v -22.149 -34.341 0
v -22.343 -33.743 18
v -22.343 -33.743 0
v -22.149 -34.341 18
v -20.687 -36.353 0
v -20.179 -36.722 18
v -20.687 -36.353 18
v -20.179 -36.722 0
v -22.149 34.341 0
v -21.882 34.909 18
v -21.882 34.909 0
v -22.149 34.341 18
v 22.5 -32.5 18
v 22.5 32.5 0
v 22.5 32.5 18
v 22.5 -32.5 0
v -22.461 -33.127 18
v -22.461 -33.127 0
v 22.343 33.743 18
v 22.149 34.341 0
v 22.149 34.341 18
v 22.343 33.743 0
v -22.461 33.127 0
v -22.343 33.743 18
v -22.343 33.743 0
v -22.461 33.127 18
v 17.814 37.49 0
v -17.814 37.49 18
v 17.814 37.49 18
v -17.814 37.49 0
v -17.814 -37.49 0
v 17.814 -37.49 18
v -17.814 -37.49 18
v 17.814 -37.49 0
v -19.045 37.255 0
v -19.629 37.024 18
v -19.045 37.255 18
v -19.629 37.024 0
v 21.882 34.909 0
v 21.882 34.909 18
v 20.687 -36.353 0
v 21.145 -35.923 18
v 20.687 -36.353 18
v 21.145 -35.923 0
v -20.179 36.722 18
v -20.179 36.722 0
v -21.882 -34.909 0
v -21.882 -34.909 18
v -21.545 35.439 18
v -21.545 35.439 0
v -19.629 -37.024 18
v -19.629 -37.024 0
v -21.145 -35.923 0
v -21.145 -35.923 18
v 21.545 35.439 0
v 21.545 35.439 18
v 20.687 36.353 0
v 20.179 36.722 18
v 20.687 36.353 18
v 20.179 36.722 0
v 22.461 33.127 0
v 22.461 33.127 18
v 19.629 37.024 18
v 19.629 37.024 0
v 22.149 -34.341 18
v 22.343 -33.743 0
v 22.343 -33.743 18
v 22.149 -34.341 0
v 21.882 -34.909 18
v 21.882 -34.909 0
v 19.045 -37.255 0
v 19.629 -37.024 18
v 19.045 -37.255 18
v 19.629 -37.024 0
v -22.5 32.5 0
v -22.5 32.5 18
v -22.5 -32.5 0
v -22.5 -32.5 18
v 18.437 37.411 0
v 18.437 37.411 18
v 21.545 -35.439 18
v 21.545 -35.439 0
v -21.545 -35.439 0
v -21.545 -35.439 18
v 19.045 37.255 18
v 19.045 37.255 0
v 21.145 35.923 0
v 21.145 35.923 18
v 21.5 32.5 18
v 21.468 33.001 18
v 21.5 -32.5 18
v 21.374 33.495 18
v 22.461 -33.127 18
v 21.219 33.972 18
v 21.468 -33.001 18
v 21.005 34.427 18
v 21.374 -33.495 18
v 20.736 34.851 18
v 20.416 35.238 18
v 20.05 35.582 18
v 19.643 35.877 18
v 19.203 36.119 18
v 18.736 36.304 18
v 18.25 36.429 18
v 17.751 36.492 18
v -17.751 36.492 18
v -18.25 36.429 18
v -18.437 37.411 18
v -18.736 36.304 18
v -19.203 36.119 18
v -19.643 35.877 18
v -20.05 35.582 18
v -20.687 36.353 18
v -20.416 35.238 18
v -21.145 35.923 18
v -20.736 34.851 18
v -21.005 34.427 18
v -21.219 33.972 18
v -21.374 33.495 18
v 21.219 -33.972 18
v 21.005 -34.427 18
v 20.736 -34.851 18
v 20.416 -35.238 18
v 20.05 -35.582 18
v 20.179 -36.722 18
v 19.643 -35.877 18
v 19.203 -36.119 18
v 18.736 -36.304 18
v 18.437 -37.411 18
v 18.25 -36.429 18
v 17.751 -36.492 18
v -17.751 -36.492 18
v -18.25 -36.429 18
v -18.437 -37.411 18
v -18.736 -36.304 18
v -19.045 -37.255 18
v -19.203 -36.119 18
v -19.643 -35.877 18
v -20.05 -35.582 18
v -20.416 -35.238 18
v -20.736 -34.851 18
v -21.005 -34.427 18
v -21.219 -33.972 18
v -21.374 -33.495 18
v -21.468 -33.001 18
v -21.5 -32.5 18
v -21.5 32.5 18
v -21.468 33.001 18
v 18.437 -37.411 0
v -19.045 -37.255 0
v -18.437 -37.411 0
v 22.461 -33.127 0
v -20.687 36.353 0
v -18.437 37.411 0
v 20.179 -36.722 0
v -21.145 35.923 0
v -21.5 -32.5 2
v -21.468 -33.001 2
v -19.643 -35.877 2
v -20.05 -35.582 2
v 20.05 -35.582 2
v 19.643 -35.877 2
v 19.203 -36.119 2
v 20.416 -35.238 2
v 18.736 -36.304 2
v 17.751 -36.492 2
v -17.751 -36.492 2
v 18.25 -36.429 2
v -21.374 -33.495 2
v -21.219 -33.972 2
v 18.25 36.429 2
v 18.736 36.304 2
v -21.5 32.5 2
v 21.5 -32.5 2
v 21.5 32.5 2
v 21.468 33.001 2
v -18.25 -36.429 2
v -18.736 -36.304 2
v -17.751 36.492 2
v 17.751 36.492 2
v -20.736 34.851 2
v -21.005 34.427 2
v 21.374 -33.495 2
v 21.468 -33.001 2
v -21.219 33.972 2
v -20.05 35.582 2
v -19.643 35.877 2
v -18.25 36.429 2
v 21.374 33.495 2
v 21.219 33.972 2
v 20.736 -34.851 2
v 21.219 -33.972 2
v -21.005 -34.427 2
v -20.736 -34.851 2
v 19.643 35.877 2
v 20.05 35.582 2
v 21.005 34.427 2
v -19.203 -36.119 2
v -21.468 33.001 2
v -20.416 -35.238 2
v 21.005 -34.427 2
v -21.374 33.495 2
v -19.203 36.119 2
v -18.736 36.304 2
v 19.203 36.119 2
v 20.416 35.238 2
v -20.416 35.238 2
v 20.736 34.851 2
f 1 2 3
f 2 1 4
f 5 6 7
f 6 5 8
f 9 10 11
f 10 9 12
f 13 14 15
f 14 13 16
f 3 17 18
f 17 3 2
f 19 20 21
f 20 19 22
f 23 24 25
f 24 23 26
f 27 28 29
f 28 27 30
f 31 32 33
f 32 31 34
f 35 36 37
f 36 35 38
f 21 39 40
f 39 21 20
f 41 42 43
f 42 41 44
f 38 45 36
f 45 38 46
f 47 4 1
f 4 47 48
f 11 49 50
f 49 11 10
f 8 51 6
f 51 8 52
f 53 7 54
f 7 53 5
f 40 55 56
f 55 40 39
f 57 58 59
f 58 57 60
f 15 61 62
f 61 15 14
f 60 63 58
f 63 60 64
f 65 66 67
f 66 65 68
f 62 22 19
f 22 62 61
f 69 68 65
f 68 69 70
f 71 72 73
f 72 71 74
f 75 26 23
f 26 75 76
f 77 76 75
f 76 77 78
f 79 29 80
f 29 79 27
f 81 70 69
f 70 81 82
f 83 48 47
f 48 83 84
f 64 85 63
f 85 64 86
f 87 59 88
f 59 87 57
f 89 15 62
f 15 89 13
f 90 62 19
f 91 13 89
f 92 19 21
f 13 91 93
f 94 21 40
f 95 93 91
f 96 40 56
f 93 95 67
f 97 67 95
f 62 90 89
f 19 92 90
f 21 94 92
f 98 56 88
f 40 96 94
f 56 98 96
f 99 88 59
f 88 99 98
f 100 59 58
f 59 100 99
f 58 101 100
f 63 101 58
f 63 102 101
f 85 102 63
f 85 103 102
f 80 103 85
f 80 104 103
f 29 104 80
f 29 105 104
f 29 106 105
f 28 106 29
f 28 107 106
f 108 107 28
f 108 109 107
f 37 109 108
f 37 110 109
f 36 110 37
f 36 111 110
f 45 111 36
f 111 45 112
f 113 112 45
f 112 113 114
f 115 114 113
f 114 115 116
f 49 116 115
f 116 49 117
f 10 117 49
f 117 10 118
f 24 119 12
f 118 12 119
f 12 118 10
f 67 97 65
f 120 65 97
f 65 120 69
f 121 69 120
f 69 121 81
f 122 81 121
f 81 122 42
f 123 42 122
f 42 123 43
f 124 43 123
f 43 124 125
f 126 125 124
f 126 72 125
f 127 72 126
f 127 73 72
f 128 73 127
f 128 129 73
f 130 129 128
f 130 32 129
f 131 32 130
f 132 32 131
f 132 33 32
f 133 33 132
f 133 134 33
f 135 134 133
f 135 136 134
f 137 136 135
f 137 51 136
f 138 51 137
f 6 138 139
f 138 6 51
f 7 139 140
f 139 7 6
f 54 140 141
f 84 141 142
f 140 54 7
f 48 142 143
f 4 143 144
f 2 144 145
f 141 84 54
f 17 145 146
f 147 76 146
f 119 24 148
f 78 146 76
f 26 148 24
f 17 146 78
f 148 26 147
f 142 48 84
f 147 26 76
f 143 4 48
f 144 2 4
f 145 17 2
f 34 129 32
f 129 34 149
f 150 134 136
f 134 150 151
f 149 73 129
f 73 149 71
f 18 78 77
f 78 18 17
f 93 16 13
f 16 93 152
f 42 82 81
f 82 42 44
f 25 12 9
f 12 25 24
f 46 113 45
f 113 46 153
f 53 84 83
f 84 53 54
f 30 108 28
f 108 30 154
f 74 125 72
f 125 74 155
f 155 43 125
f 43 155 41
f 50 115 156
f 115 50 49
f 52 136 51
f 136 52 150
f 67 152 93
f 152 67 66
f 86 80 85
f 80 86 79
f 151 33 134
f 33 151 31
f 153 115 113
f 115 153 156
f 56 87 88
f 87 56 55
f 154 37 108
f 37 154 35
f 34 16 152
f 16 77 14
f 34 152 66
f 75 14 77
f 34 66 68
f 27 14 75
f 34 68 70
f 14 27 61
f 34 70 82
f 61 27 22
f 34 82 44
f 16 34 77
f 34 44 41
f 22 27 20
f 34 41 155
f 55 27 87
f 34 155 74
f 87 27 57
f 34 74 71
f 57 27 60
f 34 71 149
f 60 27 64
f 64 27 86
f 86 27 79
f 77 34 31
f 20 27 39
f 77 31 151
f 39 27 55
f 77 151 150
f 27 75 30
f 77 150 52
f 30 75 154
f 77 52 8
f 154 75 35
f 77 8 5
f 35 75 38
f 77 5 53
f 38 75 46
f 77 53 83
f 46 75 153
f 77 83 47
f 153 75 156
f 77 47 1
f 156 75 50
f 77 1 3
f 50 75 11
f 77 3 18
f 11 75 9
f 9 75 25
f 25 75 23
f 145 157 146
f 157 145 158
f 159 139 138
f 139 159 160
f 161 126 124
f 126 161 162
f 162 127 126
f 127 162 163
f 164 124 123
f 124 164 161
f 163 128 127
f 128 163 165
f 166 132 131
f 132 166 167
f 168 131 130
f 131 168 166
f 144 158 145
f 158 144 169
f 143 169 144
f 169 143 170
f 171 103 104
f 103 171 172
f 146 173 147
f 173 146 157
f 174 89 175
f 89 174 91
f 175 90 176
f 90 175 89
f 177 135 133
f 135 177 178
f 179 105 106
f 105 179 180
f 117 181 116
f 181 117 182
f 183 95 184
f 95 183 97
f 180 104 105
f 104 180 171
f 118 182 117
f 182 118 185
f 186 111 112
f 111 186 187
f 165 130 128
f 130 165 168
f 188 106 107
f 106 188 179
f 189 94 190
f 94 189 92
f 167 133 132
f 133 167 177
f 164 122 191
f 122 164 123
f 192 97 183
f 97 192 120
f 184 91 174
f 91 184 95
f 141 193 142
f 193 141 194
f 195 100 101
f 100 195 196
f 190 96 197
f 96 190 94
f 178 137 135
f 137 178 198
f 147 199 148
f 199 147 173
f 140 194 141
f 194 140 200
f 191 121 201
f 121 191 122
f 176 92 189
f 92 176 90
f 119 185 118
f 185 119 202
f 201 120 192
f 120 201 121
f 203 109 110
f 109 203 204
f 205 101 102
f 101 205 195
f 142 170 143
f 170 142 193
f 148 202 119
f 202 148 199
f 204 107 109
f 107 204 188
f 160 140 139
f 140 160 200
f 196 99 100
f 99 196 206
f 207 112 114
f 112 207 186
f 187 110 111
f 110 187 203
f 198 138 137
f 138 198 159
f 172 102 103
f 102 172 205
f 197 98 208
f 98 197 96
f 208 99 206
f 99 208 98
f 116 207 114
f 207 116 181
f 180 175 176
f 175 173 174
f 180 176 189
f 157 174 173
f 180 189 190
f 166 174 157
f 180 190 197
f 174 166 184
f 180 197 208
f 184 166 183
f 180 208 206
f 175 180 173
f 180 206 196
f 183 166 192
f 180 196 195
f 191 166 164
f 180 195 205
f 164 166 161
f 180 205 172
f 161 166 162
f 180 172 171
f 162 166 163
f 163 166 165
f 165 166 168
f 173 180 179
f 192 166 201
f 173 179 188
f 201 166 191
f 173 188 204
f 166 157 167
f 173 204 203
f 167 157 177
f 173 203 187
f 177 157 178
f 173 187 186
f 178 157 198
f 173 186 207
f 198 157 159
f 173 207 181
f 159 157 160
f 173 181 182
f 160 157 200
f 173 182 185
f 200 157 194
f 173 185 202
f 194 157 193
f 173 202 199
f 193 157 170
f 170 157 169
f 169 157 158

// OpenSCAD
$fn = 50;


difference() {
	union() {
		hull() {
			translate(v = [-17.5000000000, 32.5000000000, 0]) {
				cylinder(h = 18, r = 5);
			}
			translate(v = [17.5000000000, 32.5000000000, 0]) {
				cylinder(h = 18, r = 5);
			}
			translate(v = [-17.5000000000, -32.5000000000, 0]) {
				cylinder(h = 18, r = 5);
			}
			translate(v = [17.5000000000, -32.5000000000, 0]) {
				cylinder(h = 18, r = 5);
			}
		}
	}
	union() {
		translate(v = [0, 0, 2]) {
			hull() {
				translate(v = [-17.5000000000, 32.5000000000, 0]) {
					cylinder(h = 16, r = 4);
				}
				translate(v = [17.5000000000, 32.5000000000, 0]) {
					cylinder(h = 16, r = 4);
				}
				translate(v = [-17.5000000000, -32.5000000000, 0]) {
					cylinder(h = 16, r = 4);
				}
				translate(v = [17.5000000000, -32.5000000000, 0]) {
					cylinder(h = 16, r = 4);
				}
			}
		}
	}
}
